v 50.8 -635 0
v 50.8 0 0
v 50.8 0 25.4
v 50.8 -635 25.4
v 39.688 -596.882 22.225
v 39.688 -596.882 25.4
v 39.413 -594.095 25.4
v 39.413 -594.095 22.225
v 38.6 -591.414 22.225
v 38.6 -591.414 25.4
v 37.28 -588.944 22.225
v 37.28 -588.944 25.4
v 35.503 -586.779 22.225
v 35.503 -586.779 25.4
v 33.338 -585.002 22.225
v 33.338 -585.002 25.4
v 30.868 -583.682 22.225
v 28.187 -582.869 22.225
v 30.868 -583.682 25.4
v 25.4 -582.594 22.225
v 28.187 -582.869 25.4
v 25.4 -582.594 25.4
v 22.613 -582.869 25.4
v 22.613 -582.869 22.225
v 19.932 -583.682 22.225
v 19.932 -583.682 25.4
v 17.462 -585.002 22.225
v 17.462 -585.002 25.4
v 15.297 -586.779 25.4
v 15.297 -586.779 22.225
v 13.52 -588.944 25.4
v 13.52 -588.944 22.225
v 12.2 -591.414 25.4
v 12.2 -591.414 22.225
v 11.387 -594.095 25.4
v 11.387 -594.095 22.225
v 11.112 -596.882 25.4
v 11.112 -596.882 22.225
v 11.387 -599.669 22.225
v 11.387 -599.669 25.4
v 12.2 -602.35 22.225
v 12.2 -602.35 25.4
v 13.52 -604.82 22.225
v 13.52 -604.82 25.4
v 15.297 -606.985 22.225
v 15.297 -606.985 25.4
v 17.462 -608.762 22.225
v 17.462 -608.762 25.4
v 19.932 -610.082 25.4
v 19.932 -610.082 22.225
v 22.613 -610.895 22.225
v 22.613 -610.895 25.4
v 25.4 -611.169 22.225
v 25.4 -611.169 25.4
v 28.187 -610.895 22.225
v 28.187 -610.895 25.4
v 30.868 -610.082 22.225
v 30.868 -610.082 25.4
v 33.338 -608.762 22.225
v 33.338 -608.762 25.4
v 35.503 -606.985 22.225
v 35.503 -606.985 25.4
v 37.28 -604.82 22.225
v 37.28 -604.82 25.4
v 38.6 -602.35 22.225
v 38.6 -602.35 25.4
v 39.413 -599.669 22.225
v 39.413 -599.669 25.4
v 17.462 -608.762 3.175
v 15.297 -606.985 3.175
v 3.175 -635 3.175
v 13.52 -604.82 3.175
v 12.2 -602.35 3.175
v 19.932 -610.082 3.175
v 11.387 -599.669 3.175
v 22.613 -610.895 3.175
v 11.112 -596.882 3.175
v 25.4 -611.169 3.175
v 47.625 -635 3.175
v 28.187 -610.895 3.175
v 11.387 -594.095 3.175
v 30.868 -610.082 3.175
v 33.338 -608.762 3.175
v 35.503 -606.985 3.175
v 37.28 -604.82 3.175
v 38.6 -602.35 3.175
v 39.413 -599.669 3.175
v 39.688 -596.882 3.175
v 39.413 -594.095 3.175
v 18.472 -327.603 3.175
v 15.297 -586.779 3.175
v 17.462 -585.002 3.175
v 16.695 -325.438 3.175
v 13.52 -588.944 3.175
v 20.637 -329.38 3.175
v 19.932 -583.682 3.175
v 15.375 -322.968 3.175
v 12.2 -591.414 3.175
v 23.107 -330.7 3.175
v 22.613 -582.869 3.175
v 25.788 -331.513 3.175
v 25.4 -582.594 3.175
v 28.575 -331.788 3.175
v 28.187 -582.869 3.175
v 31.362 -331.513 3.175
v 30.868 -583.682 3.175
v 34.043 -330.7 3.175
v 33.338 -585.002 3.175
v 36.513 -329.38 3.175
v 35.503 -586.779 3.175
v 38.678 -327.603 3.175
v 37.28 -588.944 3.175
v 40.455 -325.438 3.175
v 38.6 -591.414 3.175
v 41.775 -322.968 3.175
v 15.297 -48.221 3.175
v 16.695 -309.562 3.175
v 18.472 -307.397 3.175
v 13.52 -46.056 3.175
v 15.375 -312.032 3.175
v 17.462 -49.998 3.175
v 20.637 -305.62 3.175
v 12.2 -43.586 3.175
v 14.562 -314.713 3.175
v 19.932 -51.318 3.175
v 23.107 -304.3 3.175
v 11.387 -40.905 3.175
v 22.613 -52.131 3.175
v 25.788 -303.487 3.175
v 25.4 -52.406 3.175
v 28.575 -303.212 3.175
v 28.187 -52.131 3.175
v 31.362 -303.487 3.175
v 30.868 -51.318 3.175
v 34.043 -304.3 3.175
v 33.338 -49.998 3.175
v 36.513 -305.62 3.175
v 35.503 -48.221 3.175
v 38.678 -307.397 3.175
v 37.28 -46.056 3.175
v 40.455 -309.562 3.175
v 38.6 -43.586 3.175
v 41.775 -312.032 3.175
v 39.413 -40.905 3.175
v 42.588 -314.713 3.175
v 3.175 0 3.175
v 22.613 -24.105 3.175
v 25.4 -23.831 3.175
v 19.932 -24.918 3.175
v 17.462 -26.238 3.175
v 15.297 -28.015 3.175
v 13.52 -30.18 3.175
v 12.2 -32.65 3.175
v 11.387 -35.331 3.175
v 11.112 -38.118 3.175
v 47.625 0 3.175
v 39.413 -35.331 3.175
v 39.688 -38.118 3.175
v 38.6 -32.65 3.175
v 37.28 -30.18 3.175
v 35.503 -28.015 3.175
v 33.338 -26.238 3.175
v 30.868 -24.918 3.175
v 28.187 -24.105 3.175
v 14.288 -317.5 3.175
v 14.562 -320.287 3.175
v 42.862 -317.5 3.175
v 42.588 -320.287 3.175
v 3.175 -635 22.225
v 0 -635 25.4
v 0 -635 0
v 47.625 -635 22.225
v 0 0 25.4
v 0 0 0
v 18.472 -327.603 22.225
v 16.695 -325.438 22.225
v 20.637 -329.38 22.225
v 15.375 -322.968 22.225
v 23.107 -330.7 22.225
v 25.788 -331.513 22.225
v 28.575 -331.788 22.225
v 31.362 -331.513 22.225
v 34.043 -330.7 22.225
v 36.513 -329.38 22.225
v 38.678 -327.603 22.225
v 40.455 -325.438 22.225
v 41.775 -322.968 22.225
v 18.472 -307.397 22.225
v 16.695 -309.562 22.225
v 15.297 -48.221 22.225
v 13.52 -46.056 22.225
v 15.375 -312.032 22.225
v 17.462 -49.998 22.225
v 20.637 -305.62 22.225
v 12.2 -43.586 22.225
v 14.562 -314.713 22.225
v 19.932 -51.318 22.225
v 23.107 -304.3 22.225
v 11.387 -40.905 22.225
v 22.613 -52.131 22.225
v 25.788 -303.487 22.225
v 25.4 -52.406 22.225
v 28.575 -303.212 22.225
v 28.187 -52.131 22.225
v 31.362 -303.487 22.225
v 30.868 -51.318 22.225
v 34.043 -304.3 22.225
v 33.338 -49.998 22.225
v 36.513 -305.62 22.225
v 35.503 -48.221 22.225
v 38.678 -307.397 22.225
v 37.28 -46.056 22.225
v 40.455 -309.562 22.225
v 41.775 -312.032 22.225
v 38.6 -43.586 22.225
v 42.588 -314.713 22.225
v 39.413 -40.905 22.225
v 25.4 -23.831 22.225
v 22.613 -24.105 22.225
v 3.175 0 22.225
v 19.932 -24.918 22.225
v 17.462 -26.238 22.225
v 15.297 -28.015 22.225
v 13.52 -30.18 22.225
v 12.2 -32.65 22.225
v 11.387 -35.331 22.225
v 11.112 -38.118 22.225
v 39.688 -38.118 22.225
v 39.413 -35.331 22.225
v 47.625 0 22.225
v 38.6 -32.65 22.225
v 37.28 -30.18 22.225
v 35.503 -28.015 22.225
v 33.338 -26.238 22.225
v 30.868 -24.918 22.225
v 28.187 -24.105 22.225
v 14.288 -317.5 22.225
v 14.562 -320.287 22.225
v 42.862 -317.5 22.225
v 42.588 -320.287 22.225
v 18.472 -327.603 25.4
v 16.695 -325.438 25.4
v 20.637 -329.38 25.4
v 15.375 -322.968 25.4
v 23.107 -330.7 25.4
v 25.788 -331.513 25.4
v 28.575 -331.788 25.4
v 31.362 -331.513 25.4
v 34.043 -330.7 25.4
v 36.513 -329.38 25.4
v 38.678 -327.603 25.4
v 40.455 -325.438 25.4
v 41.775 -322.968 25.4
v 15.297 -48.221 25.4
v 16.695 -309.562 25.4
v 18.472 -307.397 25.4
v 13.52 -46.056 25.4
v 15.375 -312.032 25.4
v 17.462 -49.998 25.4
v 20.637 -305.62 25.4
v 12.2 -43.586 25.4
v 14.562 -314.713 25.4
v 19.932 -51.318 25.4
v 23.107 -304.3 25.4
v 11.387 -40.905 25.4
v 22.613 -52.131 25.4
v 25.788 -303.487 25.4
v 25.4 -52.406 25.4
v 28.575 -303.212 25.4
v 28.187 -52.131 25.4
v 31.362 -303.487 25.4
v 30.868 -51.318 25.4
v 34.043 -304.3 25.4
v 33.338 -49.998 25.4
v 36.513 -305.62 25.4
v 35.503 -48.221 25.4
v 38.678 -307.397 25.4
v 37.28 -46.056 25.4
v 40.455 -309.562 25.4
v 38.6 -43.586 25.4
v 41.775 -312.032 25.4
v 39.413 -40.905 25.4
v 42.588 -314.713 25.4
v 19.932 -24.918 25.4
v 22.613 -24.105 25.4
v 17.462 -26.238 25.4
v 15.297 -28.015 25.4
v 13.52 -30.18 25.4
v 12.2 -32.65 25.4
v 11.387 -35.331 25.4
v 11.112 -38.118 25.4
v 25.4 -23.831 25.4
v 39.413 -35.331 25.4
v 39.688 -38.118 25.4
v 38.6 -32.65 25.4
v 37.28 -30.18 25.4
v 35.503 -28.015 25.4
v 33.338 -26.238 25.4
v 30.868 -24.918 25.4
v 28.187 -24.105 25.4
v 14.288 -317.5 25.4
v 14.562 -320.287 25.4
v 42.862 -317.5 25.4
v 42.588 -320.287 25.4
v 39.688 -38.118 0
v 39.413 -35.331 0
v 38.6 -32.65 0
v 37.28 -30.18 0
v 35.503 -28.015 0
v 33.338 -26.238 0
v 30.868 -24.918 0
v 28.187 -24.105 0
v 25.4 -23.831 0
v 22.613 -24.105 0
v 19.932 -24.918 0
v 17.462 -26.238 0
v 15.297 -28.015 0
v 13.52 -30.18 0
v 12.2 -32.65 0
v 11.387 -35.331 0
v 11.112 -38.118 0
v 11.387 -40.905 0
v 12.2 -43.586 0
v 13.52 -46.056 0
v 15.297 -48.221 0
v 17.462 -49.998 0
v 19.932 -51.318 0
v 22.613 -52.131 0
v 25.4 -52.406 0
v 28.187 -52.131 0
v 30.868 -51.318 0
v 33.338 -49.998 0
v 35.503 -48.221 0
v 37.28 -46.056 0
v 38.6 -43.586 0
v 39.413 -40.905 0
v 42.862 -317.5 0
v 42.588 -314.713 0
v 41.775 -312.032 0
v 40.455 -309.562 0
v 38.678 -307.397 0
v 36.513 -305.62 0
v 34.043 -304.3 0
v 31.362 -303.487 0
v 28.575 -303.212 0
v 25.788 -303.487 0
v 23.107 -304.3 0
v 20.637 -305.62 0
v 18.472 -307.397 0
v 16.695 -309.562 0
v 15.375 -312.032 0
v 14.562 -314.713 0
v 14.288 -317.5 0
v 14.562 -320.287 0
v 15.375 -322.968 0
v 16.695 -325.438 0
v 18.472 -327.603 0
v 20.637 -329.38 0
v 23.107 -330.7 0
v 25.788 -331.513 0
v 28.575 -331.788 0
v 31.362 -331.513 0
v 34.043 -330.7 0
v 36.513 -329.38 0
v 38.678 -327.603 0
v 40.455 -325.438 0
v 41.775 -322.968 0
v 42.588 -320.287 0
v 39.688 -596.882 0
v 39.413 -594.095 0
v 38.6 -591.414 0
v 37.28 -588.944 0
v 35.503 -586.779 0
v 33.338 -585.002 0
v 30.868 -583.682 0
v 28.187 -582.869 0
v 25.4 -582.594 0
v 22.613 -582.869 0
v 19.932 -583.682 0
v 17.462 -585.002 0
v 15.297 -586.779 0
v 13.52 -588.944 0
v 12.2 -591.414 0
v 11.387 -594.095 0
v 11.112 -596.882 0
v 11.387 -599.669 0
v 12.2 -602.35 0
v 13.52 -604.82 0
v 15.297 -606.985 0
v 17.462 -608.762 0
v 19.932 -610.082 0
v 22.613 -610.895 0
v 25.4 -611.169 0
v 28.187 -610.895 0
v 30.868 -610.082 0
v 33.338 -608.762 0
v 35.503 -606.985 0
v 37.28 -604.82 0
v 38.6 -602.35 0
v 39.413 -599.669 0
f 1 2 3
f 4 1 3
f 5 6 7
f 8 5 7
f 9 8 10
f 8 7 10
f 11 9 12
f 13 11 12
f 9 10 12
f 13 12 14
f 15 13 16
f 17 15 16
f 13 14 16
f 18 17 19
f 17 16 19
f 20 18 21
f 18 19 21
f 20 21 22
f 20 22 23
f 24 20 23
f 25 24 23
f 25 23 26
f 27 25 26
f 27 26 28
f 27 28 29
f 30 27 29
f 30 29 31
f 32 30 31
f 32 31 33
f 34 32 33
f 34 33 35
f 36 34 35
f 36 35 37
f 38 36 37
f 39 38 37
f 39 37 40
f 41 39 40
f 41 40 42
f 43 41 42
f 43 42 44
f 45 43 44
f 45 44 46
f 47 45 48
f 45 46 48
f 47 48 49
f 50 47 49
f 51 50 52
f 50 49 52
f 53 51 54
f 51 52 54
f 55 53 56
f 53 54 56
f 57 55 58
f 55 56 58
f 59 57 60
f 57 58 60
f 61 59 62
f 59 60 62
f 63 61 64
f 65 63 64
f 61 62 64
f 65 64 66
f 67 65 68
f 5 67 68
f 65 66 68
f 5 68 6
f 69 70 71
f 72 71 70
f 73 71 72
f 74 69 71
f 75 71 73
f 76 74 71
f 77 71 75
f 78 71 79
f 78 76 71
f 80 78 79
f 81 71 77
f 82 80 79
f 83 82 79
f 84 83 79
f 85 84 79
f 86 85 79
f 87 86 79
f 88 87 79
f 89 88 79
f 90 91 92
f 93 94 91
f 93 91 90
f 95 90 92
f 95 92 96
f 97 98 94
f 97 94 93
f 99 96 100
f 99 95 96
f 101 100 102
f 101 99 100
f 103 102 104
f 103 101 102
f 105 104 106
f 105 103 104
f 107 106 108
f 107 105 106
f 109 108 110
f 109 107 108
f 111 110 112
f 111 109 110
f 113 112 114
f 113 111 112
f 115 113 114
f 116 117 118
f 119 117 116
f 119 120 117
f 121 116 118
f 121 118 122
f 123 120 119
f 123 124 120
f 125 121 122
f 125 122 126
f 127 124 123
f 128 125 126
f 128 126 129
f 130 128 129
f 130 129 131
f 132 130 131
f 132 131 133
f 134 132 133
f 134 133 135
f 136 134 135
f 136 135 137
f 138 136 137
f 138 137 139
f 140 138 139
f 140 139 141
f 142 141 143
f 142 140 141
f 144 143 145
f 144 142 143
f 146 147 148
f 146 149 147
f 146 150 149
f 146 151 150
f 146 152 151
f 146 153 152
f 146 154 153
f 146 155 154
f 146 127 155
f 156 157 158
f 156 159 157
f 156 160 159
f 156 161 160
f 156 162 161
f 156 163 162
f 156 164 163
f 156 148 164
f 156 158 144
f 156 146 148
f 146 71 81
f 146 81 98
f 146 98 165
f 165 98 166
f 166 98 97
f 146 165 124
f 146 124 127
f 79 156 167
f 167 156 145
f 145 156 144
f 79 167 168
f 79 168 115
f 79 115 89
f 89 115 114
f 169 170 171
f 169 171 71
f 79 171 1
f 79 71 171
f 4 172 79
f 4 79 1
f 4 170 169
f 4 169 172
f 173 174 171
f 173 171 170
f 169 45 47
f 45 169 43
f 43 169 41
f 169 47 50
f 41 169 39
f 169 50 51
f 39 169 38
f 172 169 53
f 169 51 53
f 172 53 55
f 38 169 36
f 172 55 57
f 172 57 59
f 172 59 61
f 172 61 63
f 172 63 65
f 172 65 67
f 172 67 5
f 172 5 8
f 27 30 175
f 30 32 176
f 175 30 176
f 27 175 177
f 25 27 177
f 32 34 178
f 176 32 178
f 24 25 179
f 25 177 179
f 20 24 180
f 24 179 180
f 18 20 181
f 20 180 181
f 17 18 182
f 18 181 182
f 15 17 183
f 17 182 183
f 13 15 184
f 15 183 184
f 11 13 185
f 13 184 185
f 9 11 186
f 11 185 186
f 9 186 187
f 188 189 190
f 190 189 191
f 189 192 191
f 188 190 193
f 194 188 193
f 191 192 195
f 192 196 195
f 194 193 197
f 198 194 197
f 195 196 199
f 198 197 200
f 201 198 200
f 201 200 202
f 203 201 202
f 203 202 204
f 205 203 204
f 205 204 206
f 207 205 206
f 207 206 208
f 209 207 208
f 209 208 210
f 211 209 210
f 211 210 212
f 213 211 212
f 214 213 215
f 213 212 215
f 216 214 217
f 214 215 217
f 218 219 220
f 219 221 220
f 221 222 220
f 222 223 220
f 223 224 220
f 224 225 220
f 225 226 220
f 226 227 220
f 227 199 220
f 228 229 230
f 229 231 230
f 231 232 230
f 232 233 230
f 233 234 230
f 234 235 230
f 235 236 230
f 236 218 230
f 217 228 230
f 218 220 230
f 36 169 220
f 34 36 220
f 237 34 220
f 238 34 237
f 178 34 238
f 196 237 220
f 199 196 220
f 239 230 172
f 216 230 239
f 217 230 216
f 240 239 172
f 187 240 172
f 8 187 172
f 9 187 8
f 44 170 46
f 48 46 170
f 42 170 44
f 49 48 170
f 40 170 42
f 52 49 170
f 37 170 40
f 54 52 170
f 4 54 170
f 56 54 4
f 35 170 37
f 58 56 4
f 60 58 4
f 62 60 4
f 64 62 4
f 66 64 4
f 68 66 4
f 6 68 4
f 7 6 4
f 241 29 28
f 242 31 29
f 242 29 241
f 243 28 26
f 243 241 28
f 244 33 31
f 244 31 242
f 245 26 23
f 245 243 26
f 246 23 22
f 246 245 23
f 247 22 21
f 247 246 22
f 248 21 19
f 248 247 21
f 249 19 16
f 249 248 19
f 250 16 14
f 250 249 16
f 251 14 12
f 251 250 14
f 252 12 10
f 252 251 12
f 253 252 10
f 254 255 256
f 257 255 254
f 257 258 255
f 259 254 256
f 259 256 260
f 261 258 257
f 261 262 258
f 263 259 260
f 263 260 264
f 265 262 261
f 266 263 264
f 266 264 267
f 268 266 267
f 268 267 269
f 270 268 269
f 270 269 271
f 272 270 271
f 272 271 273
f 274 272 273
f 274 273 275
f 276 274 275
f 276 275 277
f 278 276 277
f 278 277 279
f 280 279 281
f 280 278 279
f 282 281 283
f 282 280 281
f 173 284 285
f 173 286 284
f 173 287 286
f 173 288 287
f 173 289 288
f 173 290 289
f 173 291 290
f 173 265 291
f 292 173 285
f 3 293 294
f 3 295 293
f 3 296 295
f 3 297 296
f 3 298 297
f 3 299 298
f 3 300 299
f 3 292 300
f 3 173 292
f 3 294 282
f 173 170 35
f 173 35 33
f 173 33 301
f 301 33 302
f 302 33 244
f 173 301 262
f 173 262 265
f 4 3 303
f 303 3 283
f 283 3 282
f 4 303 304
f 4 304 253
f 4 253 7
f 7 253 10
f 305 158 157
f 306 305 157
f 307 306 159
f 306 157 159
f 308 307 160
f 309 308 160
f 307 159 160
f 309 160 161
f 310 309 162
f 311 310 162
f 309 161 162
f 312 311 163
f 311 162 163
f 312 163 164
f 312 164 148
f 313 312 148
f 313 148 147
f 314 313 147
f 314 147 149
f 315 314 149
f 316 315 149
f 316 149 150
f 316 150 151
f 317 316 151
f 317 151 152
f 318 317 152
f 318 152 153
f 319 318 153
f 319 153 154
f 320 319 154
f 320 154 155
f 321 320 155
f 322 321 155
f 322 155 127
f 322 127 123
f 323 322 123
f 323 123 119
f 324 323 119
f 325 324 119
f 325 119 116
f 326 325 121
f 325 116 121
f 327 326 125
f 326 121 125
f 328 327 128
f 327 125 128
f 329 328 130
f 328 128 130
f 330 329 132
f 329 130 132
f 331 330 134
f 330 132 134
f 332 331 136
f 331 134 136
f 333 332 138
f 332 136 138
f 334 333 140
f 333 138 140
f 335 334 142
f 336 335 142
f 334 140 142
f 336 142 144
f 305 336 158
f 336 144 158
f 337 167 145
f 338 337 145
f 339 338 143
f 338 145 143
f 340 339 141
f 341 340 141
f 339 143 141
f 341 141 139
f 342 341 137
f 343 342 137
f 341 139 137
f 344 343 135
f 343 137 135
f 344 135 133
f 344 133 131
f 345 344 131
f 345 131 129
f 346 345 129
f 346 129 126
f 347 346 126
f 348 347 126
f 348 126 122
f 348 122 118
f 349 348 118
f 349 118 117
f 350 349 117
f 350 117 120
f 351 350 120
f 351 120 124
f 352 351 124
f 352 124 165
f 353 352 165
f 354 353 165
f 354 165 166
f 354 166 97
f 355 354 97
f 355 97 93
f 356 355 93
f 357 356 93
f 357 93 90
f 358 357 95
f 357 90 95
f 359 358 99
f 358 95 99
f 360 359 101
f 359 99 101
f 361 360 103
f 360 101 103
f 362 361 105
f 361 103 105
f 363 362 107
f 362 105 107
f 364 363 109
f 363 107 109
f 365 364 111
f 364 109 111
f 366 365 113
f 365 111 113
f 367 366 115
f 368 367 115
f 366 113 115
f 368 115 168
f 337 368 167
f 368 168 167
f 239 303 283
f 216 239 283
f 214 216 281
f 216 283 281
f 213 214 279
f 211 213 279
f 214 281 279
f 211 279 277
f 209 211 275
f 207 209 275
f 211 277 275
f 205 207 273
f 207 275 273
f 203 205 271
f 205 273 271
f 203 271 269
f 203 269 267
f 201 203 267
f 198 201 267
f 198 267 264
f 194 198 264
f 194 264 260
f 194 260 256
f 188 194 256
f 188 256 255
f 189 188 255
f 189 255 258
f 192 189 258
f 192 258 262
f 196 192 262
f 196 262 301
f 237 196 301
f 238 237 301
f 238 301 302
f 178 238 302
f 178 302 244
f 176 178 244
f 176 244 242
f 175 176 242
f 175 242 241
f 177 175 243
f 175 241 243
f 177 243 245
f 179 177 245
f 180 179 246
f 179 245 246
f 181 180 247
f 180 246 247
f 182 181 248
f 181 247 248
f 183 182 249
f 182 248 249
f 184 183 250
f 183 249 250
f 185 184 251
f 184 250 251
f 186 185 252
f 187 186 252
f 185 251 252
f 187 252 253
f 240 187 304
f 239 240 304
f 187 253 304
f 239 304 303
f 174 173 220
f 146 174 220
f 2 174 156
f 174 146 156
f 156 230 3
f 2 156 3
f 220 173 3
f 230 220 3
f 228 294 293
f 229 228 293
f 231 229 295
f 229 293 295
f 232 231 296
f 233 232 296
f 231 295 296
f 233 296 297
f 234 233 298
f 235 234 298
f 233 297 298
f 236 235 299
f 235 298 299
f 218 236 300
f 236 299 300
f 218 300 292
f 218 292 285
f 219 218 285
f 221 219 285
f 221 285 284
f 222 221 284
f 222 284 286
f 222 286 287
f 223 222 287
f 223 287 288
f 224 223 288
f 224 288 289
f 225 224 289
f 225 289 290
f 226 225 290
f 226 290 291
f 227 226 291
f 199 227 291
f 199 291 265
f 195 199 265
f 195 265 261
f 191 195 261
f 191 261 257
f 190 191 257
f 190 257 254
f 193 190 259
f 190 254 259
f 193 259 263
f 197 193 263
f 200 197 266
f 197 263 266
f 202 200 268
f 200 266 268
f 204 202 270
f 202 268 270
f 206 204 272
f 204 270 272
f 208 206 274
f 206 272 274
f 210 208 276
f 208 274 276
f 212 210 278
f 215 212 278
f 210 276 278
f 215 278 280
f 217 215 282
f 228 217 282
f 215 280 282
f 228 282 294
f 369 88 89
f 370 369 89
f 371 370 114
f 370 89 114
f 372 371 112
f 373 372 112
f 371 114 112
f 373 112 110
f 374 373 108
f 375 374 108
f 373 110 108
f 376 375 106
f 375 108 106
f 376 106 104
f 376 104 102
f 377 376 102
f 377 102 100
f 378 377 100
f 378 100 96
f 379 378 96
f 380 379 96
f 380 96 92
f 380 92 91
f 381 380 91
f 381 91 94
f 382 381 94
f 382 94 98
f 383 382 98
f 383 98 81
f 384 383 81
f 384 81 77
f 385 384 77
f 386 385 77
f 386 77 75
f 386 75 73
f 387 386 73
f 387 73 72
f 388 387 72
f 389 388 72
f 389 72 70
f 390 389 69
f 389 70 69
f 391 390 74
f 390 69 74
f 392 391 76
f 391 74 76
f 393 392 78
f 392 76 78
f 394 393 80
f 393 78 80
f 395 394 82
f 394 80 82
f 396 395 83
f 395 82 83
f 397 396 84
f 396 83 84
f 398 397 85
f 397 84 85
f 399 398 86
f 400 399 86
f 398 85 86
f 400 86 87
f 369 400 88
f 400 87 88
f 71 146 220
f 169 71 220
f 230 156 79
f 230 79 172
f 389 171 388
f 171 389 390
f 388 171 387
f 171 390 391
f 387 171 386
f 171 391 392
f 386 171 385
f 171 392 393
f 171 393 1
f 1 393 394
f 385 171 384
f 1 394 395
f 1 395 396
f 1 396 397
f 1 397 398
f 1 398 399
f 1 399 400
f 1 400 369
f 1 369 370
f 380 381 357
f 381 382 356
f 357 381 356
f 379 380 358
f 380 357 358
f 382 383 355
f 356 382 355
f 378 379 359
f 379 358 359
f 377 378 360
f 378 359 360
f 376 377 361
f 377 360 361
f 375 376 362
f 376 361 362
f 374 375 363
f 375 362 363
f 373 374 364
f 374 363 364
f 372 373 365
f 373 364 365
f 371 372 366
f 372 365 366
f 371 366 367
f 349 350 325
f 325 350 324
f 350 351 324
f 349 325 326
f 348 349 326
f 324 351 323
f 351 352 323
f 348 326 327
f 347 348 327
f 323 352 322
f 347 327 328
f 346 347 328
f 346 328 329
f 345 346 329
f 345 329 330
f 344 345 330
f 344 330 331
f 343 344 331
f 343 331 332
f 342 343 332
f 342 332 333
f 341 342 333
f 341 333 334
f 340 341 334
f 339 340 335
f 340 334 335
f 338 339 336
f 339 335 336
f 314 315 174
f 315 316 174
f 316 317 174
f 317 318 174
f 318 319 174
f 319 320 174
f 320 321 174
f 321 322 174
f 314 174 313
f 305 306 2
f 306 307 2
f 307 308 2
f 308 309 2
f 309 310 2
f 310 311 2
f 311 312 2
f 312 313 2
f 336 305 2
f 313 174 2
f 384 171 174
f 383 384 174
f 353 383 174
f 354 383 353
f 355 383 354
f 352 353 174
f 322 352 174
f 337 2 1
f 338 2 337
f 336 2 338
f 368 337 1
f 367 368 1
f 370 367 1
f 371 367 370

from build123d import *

# Parameters (mm, degrees)
F0_W     = 50.8
F0_H     = 25.4
F0_W_2   = 44.45
F0_H_2   = 19.05
F1_DEPTH = 635
F2_R     = 14.2875
F3_DEPTH = 25.401


with BuildPart() as f1:
    # F0 (on Front) → F1 (new body)
    with BuildSketch(Plane.XZ):
        with Locations((25.4, 12.7)):
            Rectangle(F0_W, F0_H)
        with Locations((25.4, 12.7)):
            Rectangle(F0_W_2, F0_H_2, mode=Mode.SUBTRACT)
    extrude(amount=F1_DEPTH)

    # F2 (on face) → F3 (cut, through all)
    with BuildSketch(Plane.XY.offset(25.4)):
        with Locations((25.4, -38.11804)):
            Circle(F2_R)
        with Locations((28.575, -317.5)):
            Circle(F2_R)
        with Locations((25.4, -596.88196)):
            Circle(F2_R)
    extrude(amount=-F3_DEPTH, mode=Mode.SUBTRACT)


solid = f1.part
